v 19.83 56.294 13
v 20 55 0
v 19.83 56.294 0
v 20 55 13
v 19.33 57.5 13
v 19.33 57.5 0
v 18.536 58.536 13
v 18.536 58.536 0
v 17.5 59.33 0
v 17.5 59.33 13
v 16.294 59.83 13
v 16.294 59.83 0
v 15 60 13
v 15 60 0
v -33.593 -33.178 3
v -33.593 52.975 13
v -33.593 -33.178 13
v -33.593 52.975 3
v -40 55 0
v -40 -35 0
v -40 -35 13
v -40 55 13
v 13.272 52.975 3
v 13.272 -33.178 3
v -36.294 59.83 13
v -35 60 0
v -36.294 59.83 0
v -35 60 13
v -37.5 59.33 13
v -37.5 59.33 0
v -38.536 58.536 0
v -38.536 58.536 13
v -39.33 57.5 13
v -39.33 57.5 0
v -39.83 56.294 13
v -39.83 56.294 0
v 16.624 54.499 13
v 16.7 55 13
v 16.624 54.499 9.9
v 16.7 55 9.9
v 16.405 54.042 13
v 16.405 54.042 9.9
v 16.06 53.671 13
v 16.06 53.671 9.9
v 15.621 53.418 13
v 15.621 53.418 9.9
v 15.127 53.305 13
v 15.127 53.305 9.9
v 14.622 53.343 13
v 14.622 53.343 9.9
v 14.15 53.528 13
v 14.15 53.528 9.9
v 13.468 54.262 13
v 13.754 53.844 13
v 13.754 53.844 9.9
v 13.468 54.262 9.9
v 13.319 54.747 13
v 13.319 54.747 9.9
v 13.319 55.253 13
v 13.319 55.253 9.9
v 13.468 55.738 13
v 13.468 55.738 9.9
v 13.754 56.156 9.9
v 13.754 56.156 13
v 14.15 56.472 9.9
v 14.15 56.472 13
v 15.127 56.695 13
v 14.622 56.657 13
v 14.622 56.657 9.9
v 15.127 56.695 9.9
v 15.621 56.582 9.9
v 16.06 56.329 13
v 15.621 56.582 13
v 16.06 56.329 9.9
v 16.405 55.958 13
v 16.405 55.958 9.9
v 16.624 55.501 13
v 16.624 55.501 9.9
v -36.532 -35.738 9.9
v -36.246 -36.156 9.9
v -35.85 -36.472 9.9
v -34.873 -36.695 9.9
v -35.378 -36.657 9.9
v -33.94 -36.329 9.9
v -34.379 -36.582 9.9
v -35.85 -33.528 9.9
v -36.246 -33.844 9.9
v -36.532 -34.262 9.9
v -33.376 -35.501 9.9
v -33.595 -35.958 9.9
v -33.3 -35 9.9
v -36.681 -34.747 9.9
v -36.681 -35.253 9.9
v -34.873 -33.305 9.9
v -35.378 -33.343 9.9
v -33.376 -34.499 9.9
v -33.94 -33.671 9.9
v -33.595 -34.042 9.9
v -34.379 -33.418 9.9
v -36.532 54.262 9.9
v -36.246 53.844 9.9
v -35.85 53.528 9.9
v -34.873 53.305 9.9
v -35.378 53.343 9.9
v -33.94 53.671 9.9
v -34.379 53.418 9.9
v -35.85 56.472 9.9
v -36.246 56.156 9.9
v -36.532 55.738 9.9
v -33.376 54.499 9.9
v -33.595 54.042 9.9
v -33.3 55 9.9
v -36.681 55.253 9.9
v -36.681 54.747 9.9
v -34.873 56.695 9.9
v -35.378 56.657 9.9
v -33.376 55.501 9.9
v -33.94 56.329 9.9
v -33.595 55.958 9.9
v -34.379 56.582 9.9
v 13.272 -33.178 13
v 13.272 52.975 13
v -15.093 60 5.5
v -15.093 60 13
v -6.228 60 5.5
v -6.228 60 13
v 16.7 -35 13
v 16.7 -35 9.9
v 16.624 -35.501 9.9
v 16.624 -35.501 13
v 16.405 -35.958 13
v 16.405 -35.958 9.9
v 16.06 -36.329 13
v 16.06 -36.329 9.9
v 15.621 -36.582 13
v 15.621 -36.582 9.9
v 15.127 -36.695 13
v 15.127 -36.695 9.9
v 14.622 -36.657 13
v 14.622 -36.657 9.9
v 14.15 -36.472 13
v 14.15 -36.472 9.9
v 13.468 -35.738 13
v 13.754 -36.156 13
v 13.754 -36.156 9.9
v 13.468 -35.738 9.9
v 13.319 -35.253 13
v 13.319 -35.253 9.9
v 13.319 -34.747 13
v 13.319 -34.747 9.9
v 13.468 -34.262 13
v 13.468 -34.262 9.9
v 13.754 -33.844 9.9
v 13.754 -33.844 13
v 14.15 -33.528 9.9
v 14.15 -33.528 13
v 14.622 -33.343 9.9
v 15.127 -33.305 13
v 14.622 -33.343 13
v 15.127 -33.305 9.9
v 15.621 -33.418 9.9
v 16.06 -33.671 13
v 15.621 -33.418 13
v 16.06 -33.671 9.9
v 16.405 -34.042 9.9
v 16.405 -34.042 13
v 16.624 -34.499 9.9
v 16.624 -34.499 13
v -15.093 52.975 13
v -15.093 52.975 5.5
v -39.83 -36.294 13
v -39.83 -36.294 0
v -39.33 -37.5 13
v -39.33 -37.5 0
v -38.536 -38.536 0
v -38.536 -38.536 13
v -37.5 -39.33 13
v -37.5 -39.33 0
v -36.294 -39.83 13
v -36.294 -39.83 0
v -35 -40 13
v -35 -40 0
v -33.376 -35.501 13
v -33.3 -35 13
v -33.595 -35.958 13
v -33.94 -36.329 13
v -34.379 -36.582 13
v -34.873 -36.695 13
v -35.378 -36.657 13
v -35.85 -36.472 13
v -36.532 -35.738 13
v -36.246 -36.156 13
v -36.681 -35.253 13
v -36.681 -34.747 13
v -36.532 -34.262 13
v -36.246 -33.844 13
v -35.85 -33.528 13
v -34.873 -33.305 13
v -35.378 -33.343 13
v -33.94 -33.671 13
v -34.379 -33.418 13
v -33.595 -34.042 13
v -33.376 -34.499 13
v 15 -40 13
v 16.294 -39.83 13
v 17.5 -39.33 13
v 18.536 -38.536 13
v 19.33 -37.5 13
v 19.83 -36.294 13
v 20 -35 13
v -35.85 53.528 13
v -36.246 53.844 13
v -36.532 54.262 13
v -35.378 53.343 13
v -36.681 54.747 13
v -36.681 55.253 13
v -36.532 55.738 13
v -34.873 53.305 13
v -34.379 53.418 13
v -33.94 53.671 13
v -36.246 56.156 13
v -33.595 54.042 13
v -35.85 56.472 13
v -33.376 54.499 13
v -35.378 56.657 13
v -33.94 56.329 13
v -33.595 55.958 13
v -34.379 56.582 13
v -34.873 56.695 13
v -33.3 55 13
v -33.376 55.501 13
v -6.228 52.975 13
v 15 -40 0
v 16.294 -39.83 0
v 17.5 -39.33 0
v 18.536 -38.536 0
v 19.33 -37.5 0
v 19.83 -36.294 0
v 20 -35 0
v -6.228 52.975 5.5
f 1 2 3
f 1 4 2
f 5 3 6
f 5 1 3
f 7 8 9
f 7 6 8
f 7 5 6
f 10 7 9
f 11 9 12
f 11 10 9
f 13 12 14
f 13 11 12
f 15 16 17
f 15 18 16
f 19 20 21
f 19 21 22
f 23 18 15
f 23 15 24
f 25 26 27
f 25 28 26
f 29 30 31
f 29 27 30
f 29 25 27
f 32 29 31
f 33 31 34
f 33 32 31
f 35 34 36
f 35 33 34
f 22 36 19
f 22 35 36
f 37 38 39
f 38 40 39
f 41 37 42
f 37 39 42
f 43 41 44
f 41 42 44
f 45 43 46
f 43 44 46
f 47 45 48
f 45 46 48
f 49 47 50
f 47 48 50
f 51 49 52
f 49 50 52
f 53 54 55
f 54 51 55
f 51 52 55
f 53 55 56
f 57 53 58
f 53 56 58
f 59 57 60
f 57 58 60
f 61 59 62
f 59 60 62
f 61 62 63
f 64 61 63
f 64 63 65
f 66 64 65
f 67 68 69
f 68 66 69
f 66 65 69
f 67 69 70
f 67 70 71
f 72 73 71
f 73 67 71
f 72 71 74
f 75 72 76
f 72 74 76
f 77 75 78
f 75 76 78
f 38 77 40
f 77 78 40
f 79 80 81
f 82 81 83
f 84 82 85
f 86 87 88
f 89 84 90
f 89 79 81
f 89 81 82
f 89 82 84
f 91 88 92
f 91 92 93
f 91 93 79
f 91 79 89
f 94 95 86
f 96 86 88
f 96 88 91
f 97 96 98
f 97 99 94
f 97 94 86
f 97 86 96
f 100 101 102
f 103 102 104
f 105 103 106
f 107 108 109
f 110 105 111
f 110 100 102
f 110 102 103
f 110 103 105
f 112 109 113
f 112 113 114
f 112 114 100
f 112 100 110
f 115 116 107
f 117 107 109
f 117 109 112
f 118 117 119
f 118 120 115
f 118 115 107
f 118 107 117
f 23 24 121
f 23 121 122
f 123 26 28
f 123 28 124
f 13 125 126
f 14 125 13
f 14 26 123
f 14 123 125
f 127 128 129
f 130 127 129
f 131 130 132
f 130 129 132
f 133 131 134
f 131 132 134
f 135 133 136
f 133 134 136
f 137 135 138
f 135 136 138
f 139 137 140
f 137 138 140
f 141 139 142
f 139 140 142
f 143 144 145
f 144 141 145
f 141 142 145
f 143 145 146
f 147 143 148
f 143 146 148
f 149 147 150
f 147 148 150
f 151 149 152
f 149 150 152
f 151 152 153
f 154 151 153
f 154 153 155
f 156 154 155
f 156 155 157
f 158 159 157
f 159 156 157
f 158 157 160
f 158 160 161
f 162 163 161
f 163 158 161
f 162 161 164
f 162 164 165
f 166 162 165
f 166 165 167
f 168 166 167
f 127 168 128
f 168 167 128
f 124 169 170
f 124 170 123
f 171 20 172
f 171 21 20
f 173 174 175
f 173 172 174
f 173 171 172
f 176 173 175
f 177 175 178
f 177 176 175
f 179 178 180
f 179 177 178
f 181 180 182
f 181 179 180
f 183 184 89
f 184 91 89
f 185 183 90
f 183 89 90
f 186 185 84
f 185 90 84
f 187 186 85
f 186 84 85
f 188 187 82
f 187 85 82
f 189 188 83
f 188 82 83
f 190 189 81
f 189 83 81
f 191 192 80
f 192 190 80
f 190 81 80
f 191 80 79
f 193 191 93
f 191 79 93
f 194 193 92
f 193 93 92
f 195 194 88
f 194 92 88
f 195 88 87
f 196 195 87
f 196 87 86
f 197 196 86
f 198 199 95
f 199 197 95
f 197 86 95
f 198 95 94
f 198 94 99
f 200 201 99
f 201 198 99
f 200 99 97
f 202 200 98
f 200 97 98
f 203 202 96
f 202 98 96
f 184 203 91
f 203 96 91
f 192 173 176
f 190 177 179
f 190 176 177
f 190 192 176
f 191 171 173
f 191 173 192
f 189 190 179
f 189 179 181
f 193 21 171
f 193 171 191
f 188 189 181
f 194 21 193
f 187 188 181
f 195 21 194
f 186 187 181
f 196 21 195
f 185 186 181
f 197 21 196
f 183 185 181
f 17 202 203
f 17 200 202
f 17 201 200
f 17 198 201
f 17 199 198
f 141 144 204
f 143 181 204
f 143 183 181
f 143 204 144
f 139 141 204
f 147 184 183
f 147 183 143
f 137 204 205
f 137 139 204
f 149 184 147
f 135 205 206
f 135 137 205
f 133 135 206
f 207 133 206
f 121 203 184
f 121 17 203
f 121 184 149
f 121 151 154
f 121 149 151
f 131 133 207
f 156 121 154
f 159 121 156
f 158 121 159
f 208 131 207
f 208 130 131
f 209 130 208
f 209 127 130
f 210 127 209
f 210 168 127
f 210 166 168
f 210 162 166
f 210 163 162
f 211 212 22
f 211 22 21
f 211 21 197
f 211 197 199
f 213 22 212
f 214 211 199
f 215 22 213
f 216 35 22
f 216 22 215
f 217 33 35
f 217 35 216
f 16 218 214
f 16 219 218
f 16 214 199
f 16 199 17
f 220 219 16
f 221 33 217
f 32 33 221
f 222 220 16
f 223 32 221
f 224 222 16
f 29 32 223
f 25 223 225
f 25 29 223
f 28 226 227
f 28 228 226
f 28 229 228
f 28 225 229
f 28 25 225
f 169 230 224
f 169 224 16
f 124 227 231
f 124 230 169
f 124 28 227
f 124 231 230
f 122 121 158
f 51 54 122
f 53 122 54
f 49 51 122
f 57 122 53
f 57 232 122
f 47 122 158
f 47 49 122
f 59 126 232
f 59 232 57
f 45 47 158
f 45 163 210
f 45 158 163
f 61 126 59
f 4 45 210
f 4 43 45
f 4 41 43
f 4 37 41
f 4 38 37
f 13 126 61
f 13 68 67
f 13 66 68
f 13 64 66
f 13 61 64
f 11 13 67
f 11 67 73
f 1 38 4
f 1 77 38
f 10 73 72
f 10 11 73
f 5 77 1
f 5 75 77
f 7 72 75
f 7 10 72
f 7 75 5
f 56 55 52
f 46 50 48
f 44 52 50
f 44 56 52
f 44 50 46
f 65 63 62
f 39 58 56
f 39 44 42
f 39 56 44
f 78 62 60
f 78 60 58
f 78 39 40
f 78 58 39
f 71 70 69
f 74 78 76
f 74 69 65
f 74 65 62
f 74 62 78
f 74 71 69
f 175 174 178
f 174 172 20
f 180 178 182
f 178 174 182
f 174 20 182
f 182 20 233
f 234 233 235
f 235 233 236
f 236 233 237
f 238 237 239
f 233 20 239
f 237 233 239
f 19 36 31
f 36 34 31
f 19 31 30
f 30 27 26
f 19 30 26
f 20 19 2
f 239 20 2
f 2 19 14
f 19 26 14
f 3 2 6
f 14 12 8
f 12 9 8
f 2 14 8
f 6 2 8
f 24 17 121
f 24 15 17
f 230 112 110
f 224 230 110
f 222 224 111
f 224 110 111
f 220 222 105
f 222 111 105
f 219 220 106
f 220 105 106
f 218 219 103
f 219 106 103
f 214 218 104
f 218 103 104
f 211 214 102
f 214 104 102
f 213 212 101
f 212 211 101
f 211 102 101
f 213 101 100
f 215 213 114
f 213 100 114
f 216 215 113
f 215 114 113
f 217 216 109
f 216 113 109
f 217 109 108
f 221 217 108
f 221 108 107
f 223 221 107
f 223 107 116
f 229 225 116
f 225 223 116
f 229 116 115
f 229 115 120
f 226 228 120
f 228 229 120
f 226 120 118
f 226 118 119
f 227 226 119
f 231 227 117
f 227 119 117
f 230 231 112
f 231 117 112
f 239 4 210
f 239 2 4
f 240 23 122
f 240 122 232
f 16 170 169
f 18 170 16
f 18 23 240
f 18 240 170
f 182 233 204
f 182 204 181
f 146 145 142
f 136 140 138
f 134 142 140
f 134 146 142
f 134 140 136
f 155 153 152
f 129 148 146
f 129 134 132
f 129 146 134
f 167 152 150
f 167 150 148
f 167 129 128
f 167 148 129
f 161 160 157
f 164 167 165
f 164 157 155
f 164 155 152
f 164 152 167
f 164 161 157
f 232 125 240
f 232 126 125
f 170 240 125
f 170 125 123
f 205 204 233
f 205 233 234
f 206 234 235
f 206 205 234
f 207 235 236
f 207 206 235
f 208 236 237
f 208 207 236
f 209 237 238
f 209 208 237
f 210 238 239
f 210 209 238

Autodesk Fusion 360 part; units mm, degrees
sketch "Esboço1" plane through (0, 0, 0) normal (0, 0, 1) x (1, 0, 0) in component "Case"
sketch "Esboço1 (2)" plane through (0, 0, 0) normal (0, 0, 1) x (1, 0, 0) in component "Component"
  line L0 (-33.5931, -33.1775) -> (13.2718, -33.1775)
  line L1 (13.2718, -33.1775) -> (13.2718, 52.9754)
  line L2 (13.2718, 52.9754) -> (-33.5931, 52.9754)
  line L3 (-33.5931, 52.9754) -> (-33.5931, -33.1775)
  line L4 (-40, 60) -> (20, 60)
  line L5 (20, 60) -> (20, -40)
  line L6 (20, -40) -> (-40, -40)
  line L7 (-40, -40) -> (-40, 60)
  circle A0 centre (-35, -35) radius 1.7
  circle A1 centre (15, -35) radius 1.7
  circle A2 centre (-35, 55) radius 1.7
  circle A3 centre (15, 55) radius 1.7
  dimension "d1" = 86.1529
  dimension "d2" = 46.8649
  dimension "d5" = 5
  dimension "d6" = 5
  dimension "d7" = 5
  dimension "d8" = 5
  dimension "d9" = 5
  dimension "d10" = 5
  dimension "d11" = 5
  dimension "d12" = 5
  dimension "d13" = 60
  dimension "d14" = 100
extrude "Extrusão1" add sketch "Esboço1 (2)" along normal blind 9.9 contours A0 | A1 | A2 | A3 makes body 1 at (-35.7756, -33.4872, 6.6) makes body 2 at (-35.7756, 56.5128, 6.6) makes body 3 at (16.5665, -34.3397, 6.6) makes body 4 at (16.5665, 55.6603, 6.6) in component "Component"
extrude "Extrusão2" add sketch "Esboço1 (2)" along normal blind 13 bodies 1 2 3 4 in component "Component"
extrude "Extrusão3" add sketch "Esboço1 (2)" along normal blind 3 contours L0 L1 L2 L3 bodies 1 in component "Component"
sketch "Esboço2" plane through (0, 0, 13) normal (0, 0, 1) x (-1, 0, 0) in component "Component"
  circle A0 centre (-15, -55) radius 1.7
  line L0 (33.5931, 33.1775) -> (33.5931, -52.9754)
  line L1 (33.5931, -52.9754) -> (-13.2718, -52.9754)
  line L2 (-13.2718, -52.9754) -> (-13.2718, 33.1775)
  line L3 (-13.2718, 33.1775) -> (33.5931, 33.1775)
  circle A1 centre (35, 35) radius 1.7
  circle A2 centre (-15, 35) radius 1.7
  circle A3 centre (35, -55) radius 1.7
  line L4 (40, 40) -> (-20, 40)
  line L5 (-20, 40) -> (-20, -60)
  line L6 (-20, -60) -> (40, -60)
  line L7 (40, -60) -> (40, 40)
  line L8 (15.0931, -60) -> (6.2282, -60)
  line L9 (6.2282, -60) -> (6.2282, -52.9754)
  line L10 (6.2282, -52.9754) -> (15.0931, -52.9754)
  line L11 (15.0931, -52.9754) -> (15.0931, -60)
  dimension "d21" = 18.5
  dimension "d22" = 19.5
extrude "Extrusão4" cut sketch "Esboço2" against normal blind 7.5 contours L1 L6 L8 L9 L10 L11 bodies 1 in component "Component"
fillet "Arredondamento1" radius 5 1 edges at (20, -40, 6.5) on bodies 1 in component "Component"
fillet "Arredondamento2" radius 5 1 edges at (-40, -40, 6.5) on bodies 1 in component "Component"
fillet "Arredondamento3" radius 5 1 edges at (-40, 60, 6.5) on bodies 1 in component "Component"
fillet "Arredondamento4" radius 5 1 edges at (20, 60, 6.5) on bodies 1 in component "Component"
component "Case" placed x (1, 0, 0) y (0, 1, 0) z (0, 0, 1) at (0, 0, 0)
component "Component" placed x (1, 0, 0) y (0, 1, 0) z (0, 0, 1) at (0, 0, 0) in component "Case"
